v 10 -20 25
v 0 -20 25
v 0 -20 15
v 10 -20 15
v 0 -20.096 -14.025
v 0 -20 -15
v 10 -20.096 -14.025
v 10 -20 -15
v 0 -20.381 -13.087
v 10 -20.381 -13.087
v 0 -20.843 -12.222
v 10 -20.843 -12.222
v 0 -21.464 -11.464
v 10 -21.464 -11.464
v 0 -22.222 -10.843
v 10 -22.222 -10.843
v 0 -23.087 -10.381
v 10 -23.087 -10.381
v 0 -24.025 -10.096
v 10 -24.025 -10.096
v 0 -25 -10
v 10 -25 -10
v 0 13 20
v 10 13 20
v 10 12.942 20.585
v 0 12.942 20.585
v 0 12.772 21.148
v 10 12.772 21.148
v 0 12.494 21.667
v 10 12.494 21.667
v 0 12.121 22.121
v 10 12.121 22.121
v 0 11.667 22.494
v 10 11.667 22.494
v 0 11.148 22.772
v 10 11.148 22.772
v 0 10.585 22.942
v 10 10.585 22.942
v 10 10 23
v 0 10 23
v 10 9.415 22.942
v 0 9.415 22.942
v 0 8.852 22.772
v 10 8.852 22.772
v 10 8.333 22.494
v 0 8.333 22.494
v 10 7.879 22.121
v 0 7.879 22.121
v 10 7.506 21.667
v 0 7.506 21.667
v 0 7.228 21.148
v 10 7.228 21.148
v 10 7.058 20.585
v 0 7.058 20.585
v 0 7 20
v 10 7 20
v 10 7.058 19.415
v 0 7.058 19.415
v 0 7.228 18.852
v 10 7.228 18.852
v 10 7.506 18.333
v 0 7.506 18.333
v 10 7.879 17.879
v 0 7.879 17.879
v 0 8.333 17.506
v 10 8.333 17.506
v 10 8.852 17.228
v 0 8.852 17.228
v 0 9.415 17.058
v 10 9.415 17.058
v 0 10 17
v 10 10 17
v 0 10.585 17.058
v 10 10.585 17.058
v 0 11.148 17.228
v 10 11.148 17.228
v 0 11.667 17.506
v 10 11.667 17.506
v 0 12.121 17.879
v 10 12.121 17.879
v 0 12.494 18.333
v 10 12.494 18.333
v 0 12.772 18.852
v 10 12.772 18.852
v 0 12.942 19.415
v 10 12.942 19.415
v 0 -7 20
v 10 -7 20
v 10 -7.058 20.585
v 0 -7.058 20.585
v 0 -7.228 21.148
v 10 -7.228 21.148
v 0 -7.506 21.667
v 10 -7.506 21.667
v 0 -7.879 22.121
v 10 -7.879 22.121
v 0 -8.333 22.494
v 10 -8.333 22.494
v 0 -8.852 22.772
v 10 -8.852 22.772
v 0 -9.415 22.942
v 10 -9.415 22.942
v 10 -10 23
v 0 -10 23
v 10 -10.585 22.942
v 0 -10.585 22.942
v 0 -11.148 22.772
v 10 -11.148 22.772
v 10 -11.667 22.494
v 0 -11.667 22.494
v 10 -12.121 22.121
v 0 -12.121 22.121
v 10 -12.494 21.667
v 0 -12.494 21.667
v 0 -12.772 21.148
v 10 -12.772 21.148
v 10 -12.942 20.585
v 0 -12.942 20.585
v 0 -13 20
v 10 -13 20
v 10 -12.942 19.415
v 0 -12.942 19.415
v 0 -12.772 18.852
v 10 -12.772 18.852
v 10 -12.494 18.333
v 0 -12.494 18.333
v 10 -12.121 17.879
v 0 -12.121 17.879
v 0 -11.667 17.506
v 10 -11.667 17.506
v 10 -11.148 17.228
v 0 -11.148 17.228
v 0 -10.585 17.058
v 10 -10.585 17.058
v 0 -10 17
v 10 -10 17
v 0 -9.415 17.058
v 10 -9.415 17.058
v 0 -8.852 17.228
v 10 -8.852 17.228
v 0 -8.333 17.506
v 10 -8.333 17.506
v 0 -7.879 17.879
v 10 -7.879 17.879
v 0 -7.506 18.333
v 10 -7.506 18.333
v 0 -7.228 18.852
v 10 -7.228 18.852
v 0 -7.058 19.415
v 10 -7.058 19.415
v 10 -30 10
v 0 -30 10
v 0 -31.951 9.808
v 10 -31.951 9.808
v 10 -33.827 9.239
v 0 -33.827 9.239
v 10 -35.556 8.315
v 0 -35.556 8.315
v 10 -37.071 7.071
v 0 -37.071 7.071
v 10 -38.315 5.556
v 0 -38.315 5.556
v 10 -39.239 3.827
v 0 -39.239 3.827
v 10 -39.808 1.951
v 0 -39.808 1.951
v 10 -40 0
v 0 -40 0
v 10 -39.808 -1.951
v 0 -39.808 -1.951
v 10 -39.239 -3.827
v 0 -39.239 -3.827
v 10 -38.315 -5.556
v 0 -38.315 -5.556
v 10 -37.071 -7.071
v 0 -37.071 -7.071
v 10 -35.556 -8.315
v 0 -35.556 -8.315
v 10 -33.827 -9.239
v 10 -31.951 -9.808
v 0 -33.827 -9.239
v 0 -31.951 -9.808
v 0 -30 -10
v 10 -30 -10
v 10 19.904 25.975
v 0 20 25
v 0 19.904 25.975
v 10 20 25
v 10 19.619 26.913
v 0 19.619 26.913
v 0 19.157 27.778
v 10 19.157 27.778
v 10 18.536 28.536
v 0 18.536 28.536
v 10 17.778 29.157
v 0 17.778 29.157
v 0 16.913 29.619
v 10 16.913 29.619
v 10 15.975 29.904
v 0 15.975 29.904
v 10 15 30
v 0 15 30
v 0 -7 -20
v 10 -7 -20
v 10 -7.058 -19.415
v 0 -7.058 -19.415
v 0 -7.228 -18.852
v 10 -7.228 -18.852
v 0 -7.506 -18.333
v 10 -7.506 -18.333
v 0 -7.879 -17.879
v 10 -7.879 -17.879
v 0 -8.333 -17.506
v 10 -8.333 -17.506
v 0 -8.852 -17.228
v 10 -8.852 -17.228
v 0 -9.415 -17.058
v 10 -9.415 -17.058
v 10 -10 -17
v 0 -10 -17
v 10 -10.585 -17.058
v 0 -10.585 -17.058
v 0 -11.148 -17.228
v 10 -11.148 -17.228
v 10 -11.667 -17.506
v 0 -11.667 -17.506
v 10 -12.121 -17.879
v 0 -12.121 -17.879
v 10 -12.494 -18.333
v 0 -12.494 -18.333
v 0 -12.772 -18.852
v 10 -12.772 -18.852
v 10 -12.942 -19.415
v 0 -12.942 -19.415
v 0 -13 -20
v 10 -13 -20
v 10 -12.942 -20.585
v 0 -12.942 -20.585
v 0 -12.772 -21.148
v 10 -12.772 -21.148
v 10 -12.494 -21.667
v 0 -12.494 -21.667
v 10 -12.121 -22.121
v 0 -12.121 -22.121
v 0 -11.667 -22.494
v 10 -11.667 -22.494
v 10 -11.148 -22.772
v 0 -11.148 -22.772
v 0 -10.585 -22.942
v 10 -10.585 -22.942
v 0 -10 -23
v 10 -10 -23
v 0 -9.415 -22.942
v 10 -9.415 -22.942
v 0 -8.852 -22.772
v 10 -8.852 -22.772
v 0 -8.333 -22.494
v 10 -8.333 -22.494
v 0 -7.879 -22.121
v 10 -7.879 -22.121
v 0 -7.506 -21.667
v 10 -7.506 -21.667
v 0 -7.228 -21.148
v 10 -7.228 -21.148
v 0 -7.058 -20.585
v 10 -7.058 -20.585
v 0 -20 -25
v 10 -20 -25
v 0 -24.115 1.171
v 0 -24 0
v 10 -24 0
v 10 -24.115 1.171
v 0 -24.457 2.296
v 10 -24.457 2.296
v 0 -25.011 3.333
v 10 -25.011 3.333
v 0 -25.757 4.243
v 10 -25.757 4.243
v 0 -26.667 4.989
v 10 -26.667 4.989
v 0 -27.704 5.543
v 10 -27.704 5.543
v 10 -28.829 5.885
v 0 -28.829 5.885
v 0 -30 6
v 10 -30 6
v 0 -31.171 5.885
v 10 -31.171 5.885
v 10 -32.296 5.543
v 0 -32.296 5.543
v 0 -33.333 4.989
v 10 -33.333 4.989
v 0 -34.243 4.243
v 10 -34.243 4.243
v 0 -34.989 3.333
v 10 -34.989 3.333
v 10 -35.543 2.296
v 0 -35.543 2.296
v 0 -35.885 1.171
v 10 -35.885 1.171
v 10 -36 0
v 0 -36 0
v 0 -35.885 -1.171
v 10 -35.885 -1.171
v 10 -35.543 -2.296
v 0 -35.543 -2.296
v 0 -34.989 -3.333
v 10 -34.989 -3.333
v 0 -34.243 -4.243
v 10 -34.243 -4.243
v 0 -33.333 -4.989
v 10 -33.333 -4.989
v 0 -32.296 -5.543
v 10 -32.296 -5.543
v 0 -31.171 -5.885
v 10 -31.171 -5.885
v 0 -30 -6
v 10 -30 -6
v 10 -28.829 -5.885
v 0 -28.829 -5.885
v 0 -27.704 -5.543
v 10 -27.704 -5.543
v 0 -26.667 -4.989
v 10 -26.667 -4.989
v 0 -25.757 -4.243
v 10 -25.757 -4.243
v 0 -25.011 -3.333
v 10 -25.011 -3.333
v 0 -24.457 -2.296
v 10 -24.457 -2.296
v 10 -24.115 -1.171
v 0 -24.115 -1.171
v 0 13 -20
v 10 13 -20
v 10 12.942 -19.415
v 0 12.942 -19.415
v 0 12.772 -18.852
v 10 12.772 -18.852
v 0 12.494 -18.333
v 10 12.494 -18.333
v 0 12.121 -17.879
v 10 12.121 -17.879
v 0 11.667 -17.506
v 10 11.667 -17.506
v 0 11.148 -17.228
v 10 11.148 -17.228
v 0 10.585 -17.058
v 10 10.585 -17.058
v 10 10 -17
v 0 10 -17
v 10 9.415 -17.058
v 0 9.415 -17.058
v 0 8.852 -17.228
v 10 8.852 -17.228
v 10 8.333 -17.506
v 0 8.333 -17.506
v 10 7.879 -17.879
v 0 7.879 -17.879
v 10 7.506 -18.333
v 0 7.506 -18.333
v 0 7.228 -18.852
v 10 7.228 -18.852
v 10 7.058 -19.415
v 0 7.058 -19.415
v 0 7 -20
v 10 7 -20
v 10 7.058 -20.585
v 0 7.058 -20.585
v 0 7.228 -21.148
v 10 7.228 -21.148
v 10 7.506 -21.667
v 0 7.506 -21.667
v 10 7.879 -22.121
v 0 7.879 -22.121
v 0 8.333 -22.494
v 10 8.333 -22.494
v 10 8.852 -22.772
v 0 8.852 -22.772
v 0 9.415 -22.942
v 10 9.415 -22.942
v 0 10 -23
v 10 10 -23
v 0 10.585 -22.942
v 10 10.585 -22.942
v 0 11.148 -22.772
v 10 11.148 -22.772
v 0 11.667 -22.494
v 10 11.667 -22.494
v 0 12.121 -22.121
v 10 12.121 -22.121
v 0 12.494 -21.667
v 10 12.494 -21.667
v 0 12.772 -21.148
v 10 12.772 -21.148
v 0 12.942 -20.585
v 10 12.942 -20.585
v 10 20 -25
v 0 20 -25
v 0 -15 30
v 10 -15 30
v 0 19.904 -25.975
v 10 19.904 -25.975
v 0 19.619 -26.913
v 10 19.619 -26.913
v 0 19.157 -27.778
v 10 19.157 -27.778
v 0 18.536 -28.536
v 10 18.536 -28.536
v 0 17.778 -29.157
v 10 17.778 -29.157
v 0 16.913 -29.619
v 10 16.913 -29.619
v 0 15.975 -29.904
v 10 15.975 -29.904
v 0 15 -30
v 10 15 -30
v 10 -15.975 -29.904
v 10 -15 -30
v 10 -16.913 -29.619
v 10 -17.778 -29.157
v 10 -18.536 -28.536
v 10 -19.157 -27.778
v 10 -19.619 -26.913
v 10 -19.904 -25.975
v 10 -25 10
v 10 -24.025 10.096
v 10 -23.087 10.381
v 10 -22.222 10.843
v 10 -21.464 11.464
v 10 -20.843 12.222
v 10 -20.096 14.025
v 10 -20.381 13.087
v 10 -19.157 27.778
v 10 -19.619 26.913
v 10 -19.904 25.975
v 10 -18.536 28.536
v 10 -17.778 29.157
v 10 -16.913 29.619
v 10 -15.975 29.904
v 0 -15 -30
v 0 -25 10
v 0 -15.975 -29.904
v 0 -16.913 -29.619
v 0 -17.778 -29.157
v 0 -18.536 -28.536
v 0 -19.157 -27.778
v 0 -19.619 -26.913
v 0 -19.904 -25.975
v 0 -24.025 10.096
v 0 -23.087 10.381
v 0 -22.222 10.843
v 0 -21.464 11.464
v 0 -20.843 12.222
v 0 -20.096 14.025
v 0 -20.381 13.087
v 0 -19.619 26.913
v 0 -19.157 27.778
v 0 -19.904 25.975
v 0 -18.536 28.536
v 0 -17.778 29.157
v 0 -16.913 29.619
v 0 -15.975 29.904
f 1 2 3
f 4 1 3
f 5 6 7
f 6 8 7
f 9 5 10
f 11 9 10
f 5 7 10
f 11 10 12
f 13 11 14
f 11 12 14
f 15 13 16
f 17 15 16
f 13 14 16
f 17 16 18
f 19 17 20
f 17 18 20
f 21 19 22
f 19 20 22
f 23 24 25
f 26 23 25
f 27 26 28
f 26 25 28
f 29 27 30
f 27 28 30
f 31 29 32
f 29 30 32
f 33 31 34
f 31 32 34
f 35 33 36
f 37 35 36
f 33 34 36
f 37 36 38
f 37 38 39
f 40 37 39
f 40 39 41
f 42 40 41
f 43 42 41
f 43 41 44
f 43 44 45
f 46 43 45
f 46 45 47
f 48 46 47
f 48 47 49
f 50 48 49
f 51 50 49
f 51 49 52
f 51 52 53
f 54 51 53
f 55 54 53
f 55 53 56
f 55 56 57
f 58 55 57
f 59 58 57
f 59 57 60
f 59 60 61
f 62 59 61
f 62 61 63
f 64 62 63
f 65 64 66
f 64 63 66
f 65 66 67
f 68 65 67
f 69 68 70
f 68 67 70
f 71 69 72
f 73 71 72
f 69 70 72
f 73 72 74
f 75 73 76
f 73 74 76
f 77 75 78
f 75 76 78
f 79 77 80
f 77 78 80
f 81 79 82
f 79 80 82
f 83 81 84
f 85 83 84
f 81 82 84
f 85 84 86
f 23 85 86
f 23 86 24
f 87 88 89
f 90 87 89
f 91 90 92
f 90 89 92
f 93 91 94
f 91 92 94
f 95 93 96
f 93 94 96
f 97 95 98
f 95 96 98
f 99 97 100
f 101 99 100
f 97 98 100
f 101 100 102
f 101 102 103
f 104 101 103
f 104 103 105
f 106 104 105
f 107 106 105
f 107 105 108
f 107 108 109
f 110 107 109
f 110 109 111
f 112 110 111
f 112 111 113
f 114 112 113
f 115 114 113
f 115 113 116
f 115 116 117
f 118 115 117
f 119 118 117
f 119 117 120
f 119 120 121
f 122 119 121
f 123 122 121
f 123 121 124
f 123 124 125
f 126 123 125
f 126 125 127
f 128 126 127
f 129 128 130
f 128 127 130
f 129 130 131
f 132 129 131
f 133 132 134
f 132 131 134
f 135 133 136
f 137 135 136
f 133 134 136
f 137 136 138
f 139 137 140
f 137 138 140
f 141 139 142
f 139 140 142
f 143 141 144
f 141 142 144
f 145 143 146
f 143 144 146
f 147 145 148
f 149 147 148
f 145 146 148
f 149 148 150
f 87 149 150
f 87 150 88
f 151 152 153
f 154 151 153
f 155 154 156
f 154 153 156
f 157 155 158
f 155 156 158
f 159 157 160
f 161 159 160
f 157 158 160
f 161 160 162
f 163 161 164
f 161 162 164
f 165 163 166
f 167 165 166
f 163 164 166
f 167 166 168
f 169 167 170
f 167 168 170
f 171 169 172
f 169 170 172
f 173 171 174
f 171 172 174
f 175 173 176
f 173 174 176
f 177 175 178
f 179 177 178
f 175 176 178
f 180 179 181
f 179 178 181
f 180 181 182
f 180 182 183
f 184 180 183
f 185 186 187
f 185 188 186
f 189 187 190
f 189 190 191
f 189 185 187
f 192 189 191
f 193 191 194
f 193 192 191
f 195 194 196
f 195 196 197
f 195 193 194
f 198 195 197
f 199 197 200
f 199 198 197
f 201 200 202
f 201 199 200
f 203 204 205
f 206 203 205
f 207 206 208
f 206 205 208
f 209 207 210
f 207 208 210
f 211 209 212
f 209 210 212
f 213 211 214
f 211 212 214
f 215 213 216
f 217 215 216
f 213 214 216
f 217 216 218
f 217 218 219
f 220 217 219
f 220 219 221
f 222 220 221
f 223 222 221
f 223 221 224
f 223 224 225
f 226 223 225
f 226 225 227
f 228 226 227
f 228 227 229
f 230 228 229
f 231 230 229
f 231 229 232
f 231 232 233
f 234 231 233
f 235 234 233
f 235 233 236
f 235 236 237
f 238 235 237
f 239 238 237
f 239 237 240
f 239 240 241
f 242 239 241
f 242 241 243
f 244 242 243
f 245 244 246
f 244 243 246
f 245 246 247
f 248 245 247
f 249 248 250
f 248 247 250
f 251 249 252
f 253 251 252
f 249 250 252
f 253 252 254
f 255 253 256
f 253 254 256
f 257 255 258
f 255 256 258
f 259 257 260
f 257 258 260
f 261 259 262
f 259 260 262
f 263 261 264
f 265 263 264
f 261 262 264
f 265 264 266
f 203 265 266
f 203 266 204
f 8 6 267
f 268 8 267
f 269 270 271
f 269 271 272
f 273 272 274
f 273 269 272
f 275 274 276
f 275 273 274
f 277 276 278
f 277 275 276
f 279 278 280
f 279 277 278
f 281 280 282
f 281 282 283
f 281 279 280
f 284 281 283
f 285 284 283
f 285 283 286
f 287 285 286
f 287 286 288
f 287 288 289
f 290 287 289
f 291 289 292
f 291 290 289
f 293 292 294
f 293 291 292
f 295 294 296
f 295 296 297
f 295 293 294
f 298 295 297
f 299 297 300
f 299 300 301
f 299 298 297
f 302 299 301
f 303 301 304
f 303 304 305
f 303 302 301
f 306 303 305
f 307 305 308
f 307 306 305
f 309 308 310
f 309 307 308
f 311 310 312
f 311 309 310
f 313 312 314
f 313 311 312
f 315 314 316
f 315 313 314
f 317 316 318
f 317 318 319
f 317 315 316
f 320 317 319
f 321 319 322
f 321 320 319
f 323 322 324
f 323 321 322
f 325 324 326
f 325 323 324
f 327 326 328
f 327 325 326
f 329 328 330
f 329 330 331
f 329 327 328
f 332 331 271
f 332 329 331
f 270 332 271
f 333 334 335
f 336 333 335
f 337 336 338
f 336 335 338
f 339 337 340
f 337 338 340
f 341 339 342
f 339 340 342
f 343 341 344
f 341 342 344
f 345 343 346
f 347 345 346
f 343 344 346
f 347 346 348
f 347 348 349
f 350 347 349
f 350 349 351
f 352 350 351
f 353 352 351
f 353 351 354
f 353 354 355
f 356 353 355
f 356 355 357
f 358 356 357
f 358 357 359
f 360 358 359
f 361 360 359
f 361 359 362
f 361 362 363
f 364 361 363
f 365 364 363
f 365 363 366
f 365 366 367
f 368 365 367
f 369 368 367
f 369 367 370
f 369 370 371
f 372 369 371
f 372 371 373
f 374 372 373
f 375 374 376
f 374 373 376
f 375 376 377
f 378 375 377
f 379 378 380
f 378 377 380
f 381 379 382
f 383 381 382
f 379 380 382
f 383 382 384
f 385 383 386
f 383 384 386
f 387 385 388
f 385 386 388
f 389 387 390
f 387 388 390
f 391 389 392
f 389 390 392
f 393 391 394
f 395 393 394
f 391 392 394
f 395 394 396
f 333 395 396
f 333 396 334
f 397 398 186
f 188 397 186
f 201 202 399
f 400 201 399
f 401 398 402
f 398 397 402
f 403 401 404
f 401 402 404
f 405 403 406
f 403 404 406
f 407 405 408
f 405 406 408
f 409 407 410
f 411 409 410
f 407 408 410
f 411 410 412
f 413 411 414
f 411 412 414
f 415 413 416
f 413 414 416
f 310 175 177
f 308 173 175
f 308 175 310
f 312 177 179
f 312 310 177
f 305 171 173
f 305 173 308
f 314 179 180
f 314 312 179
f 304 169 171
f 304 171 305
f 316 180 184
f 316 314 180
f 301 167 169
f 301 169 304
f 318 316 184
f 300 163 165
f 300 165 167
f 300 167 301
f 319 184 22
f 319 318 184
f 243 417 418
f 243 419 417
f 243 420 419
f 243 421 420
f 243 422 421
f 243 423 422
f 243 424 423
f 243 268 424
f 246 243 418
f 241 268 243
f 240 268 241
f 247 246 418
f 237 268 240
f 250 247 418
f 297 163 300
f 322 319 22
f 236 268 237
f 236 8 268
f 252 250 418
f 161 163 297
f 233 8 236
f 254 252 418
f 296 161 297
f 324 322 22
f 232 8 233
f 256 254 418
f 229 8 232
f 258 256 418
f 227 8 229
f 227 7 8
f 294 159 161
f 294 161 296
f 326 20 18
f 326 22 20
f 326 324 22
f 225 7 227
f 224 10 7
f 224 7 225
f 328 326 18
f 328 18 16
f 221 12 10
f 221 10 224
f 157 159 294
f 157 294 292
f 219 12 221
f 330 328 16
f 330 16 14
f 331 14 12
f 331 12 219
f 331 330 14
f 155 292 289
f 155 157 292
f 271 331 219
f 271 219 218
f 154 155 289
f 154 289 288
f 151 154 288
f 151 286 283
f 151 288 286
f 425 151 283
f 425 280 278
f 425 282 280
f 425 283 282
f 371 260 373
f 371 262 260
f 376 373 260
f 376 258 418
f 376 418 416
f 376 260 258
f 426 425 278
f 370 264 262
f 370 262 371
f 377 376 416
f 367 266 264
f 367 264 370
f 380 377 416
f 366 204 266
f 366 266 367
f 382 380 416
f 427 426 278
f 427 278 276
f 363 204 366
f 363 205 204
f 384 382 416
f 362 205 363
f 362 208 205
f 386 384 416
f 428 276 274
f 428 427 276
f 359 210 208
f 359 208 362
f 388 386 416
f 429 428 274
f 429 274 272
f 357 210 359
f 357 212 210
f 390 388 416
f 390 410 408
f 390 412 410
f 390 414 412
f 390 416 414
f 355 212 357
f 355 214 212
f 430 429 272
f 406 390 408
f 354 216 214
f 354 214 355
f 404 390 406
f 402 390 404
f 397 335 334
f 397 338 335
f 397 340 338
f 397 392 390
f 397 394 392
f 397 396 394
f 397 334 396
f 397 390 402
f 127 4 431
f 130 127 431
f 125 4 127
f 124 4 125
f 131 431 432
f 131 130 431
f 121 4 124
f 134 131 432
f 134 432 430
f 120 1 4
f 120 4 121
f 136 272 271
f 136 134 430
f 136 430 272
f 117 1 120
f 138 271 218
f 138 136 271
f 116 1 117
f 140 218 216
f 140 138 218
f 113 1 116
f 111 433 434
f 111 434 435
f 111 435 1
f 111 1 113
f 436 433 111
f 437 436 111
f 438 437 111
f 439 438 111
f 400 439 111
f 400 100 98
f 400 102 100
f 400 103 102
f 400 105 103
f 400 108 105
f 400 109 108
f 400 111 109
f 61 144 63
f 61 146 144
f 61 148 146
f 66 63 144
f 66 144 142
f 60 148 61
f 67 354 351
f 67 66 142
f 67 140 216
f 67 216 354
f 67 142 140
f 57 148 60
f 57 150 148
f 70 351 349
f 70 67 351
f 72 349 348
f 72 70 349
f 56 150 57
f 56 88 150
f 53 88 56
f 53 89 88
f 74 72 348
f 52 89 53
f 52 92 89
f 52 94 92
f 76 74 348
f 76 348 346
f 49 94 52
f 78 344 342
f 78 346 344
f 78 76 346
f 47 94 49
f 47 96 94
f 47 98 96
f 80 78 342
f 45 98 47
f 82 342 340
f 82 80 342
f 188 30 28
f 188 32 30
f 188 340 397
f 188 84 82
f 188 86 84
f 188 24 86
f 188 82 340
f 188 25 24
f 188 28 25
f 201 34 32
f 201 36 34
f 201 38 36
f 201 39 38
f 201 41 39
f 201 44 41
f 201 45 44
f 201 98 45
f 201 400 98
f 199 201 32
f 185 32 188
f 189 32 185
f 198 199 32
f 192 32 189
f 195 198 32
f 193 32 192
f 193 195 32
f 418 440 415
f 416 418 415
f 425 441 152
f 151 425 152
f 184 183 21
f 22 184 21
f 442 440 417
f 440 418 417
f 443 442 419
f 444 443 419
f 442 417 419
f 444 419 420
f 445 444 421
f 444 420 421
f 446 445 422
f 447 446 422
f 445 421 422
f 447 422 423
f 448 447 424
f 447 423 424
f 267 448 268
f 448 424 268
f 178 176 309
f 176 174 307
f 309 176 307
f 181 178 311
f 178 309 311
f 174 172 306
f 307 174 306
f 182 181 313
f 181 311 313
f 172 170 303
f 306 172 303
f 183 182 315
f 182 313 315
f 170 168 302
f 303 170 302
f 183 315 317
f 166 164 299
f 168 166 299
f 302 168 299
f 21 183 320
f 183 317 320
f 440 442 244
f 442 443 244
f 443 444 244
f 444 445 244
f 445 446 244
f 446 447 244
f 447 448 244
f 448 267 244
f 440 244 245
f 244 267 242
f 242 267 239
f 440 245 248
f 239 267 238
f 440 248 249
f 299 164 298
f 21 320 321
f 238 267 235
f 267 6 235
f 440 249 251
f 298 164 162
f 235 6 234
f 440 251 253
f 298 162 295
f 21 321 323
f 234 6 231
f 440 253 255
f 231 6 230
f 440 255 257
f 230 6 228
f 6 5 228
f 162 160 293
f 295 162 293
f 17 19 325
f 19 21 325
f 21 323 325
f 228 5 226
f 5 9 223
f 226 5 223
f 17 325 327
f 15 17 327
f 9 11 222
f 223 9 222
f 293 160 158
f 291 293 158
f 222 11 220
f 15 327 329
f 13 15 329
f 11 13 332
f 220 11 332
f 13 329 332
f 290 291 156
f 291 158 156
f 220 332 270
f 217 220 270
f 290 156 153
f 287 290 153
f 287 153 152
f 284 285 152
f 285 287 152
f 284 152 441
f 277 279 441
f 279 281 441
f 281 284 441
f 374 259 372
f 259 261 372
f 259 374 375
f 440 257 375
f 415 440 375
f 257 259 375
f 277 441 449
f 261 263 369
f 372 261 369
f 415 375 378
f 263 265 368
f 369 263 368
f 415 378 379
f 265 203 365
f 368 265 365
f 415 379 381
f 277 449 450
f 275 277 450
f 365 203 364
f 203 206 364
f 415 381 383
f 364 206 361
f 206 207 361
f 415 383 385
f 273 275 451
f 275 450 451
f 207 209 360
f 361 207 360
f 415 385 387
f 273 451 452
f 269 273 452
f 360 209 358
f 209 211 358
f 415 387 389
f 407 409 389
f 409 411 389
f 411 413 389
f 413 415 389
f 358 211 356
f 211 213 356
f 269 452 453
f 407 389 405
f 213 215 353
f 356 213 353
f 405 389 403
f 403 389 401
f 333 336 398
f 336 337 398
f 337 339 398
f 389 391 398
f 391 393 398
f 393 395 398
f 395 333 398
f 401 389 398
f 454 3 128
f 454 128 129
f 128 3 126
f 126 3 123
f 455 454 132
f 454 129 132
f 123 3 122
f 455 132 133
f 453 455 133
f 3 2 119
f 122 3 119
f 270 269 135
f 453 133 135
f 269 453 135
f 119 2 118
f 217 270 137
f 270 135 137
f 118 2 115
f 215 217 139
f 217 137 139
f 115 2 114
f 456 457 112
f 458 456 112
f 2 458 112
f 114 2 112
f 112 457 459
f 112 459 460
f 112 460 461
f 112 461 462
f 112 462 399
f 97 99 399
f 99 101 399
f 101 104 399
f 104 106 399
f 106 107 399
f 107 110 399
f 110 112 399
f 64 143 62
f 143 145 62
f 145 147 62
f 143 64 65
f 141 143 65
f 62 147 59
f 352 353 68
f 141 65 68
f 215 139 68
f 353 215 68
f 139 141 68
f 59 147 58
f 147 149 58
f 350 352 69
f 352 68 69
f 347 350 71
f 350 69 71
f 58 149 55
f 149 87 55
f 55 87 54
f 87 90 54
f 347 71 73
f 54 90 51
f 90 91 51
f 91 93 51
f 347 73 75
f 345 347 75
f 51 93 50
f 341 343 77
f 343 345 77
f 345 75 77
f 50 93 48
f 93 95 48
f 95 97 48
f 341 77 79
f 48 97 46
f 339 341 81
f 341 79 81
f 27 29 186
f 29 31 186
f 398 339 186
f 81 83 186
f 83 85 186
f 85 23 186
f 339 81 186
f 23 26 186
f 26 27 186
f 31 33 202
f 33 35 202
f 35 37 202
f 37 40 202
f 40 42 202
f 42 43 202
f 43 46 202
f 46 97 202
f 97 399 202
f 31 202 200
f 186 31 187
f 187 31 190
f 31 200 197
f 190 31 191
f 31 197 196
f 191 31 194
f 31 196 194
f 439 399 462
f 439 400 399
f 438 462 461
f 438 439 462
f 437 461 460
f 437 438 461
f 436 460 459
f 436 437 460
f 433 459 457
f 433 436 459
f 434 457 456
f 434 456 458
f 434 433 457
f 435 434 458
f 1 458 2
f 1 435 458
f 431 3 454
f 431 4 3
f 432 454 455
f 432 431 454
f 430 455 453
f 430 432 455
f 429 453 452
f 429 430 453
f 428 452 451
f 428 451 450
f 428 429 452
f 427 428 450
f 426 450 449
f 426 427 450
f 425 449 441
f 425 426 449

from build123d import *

# Parameters (mm, degrees)
F0_R     = 6
F1_DEPTH = 10
F2_R     = 5
F4_D     = 6
F5_D     = 6


with BuildPart() as f1:
    # F0 (on Right) → F1 (new body)
    with BuildSketch(Plane.YZ):
        with BuildLine():
            Line((20, -30), (20, 30))
            Line((20, 30), (-20, 30))
            Line((-20, 30), (-20, 10))
            Line((-20, 10), (-30, 10))
            ThreePointArc((-30, 10), (-40, 0), (-30, -10))
            Line((-30, -10), (-20, -10))
            Line((-20, -10), (-20, -30))
            Line((-20, -30), (20, -30))
        make_face()
        with Locations((-30, 0)):
            Circle(F0_R, mode=Mode.SUBTRACT)
    extrude(amount=F1_DEPTH)

    # F2
    f2_edges = [f1.edges().sort_by_distance(p)[0] for p in [
        (5, 20, 30),
        (5, 20, -30),
        (5, -20, 30),
        (5, -20, -30),
        (5, -20, -10),
        (5, -20, 10),
    ]]
    fillet(f2_edges, radius=F2_R)

    # F4 (through all)
    with Locations(Plane(origin=(0, 0, 0), x_dir=(0, -1, 0), z_dir=(-1, 0, 0))):
        with Locations((-10, -20), (10, -20)):
            Hole(F4_D / 2)

    # F5 (through all)
    with Locations(Plane(origin=(0, 0, 0), x_dir=(0, -1, 0), z_dir=(-1, 0, 0))):
        with Locations((10, 20), (-10, 20)):
            Hole(F5_D / 2)


solid = f1.part
